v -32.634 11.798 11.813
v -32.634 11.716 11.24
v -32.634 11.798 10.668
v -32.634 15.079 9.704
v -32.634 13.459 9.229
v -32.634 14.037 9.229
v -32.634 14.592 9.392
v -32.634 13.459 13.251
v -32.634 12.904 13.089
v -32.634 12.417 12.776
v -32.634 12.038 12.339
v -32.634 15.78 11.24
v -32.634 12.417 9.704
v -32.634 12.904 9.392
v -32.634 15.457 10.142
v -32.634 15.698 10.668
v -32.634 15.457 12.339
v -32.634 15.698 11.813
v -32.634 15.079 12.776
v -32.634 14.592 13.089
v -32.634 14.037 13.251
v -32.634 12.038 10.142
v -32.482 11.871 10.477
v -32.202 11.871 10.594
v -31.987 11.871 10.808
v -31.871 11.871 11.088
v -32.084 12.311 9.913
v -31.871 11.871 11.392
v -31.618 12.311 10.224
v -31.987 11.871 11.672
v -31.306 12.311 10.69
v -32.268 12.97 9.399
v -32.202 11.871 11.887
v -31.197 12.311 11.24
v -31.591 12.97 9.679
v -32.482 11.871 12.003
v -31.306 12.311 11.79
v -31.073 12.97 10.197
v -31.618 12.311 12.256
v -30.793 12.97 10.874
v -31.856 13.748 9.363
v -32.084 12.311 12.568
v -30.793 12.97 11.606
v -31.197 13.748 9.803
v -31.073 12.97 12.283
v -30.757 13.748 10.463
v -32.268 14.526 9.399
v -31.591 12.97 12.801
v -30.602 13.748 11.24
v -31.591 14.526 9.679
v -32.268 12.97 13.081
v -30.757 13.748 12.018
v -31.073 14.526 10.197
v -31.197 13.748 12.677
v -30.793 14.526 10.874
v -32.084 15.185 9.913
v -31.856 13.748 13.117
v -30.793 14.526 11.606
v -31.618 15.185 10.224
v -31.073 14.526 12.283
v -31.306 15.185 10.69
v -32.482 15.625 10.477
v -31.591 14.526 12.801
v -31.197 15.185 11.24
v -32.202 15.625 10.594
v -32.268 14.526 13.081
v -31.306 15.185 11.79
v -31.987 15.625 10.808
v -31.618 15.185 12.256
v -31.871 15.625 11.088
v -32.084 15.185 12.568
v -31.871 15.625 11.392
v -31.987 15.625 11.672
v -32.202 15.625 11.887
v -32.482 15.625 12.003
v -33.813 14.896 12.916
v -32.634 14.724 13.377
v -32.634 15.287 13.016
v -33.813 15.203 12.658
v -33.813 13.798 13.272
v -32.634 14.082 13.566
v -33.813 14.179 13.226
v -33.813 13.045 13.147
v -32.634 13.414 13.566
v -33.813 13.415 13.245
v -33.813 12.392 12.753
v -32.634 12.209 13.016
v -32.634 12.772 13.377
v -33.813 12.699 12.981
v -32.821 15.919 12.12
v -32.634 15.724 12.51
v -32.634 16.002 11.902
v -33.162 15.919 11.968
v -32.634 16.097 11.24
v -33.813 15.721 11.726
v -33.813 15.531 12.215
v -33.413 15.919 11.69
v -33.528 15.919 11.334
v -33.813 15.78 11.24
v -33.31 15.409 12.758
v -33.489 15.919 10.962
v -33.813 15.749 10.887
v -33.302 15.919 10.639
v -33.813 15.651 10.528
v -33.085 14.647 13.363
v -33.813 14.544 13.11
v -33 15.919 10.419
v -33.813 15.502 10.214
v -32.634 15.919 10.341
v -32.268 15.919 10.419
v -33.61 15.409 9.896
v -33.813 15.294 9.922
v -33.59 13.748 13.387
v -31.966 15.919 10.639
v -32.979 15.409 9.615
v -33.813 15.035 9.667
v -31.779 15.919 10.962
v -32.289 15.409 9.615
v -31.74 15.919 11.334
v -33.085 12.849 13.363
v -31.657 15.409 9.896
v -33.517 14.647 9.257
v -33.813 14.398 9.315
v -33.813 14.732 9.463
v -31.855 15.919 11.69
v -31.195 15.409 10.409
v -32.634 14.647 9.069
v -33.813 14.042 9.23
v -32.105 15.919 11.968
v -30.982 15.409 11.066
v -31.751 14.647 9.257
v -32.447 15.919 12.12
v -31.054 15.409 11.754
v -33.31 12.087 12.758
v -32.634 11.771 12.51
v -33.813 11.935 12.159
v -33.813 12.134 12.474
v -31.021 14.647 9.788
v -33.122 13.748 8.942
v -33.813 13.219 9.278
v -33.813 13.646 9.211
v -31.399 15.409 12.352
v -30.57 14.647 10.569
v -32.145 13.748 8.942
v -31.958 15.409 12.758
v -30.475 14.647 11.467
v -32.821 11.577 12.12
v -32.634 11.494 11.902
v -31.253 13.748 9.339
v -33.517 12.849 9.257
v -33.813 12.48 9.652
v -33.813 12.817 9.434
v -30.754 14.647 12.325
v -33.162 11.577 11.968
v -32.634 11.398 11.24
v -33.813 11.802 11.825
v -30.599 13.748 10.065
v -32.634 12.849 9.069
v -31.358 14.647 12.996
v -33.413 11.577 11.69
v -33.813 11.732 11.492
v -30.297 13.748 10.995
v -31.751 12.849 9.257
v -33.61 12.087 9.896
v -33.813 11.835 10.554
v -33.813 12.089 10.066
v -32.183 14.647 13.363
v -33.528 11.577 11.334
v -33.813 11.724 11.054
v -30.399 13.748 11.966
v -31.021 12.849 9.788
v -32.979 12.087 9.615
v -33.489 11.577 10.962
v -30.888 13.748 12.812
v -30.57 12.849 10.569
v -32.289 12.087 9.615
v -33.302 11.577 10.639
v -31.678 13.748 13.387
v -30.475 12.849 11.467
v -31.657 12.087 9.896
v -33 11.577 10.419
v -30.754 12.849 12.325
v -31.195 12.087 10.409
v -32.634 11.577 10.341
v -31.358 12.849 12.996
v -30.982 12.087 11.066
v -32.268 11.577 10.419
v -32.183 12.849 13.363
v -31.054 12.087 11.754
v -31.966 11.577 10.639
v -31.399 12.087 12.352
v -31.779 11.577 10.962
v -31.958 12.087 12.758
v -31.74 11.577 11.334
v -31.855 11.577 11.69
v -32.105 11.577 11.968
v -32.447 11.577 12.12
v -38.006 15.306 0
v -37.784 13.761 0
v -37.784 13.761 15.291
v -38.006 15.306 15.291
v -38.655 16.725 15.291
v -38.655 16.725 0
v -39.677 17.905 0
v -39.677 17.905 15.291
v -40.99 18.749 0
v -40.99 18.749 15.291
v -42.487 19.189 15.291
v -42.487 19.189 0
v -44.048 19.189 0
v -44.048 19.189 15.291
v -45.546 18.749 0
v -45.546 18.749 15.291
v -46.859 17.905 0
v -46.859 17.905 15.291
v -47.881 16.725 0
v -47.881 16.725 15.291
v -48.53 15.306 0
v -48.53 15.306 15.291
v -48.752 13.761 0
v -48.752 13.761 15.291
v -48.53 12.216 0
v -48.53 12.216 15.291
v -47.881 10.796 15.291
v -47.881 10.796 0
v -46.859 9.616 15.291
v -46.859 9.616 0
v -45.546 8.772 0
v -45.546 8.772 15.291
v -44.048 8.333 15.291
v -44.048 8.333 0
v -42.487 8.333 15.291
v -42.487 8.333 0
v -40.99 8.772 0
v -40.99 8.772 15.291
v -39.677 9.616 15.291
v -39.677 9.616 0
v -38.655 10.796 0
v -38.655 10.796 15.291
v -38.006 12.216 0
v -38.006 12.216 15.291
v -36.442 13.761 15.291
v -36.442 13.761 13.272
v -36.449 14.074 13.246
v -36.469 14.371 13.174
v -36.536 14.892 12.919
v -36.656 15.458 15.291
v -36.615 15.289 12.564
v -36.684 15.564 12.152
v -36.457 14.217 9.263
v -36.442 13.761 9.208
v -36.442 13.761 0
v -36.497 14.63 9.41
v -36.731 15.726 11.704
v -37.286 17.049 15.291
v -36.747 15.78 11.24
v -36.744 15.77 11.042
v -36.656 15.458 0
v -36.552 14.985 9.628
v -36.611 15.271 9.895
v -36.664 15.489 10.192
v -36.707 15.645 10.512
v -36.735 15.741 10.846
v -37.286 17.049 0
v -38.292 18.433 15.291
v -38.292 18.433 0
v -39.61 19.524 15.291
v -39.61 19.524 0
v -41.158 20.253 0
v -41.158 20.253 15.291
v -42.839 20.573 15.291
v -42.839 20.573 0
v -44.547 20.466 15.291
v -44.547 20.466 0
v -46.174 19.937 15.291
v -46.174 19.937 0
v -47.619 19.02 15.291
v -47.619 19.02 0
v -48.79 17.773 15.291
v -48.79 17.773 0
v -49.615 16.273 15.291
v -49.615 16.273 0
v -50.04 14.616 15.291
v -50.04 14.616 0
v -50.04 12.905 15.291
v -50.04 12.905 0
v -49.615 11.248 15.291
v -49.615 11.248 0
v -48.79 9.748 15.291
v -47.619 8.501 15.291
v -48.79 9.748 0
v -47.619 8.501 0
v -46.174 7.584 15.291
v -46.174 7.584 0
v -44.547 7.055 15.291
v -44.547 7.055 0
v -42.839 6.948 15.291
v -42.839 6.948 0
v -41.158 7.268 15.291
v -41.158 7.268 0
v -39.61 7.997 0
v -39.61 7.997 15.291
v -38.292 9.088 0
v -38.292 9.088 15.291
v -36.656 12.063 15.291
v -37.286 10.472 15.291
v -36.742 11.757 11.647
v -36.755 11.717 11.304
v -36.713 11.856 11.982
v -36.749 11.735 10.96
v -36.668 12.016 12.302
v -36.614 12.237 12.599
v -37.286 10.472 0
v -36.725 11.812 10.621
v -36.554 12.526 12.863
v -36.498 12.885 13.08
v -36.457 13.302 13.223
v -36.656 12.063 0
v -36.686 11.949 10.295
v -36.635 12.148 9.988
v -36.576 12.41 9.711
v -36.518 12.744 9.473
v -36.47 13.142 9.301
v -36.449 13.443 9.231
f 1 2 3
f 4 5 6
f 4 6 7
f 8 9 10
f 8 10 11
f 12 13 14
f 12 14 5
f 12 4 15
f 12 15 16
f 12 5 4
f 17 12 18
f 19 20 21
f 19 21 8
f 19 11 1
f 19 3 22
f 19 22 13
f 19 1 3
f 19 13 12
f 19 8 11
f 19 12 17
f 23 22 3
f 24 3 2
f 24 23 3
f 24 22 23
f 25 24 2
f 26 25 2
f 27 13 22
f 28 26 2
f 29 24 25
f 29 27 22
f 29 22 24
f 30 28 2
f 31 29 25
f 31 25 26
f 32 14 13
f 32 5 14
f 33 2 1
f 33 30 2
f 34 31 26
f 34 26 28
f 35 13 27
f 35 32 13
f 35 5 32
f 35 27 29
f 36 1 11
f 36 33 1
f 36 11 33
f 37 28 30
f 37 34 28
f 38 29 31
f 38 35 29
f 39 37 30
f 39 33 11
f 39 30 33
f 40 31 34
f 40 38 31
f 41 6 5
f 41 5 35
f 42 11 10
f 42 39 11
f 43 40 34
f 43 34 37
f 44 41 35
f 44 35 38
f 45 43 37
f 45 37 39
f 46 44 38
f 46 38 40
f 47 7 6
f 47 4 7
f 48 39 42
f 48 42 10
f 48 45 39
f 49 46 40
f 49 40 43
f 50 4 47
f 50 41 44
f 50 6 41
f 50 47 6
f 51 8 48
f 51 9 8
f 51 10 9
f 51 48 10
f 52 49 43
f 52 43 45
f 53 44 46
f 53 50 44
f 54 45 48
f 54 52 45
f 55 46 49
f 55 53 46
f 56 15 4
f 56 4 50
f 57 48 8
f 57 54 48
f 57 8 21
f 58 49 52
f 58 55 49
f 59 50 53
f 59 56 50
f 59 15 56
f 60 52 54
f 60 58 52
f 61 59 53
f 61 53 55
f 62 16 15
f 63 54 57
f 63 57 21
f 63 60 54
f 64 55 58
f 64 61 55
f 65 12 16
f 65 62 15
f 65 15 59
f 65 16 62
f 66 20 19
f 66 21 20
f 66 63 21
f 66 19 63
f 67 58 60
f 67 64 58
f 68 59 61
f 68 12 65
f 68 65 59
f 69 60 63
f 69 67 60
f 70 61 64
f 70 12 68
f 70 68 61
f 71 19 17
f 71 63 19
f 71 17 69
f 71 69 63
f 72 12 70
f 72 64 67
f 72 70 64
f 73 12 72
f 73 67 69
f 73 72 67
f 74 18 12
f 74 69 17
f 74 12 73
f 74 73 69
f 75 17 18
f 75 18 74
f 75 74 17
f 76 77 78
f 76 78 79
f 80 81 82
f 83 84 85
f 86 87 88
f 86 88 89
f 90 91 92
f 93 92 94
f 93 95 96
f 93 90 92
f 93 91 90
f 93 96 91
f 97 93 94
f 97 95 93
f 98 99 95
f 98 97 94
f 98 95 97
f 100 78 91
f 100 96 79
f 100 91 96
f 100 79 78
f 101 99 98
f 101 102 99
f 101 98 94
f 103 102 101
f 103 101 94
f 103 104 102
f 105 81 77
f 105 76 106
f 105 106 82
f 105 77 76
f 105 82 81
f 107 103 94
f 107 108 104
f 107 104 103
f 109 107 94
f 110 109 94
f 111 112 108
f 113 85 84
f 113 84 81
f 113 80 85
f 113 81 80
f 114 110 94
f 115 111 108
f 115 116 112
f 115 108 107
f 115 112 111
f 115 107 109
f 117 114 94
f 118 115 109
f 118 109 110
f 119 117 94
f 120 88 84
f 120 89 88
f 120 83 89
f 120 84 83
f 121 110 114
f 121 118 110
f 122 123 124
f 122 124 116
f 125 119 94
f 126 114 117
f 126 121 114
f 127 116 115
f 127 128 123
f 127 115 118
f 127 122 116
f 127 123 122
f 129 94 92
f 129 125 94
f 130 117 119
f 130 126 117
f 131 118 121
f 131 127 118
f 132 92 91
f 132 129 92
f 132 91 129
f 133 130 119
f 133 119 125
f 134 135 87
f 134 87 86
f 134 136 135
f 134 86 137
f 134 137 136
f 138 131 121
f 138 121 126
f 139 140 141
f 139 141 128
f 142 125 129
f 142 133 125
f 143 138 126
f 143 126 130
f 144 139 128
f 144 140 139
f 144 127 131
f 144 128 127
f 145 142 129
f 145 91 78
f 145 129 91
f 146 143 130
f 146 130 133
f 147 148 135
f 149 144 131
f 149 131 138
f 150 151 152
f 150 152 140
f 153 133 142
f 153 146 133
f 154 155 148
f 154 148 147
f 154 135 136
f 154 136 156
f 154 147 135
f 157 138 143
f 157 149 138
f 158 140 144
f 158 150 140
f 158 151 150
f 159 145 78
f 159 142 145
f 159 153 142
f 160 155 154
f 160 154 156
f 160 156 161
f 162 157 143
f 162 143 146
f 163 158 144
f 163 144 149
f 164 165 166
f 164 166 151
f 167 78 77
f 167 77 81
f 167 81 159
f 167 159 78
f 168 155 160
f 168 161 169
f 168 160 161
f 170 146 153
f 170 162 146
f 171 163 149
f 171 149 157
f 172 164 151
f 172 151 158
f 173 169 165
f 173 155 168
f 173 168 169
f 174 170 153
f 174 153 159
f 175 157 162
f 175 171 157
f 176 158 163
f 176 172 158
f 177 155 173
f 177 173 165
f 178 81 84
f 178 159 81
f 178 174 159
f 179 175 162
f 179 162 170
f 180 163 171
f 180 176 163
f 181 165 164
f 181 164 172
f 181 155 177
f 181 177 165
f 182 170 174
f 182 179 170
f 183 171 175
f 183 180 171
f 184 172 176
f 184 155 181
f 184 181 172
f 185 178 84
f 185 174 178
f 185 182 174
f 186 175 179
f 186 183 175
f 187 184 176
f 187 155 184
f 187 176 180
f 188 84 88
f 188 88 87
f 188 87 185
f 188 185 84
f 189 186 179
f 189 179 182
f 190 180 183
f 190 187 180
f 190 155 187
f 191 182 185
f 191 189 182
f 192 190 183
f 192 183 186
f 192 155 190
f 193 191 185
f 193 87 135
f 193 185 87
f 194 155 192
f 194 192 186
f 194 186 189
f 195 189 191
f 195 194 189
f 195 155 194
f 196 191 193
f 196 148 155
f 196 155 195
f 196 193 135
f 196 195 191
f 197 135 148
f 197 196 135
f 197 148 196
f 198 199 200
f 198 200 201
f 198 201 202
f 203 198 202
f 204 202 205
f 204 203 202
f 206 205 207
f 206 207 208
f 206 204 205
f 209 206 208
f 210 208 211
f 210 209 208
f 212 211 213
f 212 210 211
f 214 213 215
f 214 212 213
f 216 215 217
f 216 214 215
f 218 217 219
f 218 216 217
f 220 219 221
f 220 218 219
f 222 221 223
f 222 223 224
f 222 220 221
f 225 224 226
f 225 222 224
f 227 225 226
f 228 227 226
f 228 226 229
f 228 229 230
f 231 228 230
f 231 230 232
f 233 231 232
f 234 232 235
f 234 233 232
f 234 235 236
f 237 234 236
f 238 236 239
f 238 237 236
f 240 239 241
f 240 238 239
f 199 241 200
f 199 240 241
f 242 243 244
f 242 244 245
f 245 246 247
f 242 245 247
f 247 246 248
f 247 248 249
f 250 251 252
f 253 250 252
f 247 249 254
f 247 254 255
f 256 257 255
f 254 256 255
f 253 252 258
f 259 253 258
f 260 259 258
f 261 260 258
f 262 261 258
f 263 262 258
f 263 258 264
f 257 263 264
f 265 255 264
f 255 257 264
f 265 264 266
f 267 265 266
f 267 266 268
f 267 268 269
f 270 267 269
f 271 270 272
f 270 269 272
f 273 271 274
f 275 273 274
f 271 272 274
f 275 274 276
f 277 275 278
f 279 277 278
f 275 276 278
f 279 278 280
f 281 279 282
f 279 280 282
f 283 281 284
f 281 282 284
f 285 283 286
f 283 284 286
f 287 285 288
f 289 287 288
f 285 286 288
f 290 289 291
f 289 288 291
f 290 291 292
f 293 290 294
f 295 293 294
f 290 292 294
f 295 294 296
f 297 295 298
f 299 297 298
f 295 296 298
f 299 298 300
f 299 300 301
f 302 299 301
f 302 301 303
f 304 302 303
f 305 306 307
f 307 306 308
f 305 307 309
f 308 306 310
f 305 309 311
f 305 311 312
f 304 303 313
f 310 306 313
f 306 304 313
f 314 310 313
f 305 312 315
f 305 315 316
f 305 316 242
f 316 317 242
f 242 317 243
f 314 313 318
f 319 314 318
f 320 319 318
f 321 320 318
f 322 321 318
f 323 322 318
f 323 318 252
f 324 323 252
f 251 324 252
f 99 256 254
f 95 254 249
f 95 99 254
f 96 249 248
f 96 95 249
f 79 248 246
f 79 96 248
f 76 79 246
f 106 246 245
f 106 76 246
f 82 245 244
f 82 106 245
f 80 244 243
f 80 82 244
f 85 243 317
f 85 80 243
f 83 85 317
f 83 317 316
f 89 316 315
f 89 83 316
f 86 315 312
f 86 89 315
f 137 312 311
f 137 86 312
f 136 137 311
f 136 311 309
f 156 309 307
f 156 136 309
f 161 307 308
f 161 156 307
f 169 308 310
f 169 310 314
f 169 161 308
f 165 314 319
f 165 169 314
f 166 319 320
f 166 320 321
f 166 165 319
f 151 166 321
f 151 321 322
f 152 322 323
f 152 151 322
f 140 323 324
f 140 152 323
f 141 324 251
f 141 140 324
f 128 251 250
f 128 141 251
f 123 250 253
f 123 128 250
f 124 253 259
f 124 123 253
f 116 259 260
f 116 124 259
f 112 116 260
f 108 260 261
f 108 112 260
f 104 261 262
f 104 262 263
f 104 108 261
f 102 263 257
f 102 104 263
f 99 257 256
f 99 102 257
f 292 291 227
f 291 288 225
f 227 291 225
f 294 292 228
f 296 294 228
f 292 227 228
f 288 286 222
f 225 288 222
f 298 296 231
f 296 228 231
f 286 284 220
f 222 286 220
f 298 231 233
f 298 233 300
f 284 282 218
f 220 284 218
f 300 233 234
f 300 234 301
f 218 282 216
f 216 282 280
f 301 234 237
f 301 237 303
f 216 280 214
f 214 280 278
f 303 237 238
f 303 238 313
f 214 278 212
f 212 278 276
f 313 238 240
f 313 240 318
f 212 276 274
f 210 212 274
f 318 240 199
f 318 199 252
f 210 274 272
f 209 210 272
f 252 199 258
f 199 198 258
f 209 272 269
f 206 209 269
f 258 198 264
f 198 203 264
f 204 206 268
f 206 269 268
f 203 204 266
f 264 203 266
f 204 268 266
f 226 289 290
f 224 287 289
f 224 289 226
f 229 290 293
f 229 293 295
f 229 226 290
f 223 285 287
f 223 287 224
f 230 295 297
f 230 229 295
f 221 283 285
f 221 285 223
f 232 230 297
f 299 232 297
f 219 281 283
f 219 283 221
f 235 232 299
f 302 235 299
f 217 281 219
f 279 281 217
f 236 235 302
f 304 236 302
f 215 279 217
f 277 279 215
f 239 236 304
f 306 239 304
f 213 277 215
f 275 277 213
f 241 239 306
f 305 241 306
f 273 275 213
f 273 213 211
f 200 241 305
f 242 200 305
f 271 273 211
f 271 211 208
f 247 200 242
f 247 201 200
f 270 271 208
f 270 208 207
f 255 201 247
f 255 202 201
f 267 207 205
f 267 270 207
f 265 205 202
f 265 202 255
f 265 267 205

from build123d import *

# Parameters (mm, degrees)
F0_R          = 6.826248
F0_R_2        = 5.483861
F1_DEPTH      = 15.2908
F3_R          = 2.032
F4_DEPTH      = 2.8956
F4_DEPTH_BACK = 1.6256


with BuildPart() as f1:
    # F0 (on Top) → F1 (new body)
    with BuildSketch(Plane.XY):
        with Locations((-43.26782, 13.760585)):
            Circle(F0_R)
        with Locations((-43.26782, 13.760585)):
            Circle(F0_R_2, mode=Mode.SUBTRACT)
    extrude(amount=F1_DEPTH)

    # F3 (on offset) → F4 (join, two sides)
    with BuildSketch(Plane.YZ.offset(-35.52952)) as f4_sk:
        with Locations((13.747922, 11.24013)):
            Circle(F3_R)
    extrude(amount=F4_DEPTH)
    extrude(f4_sk.sketch, amount=-F4_DEPTH_BACK)

    # F5 (on face) → F6 (revolve)
    with BuildSketch(Plane.YZ.offset(-32.63392)):
        with BuildLine():
            Line((11.398422, 11.24013), (11.715922, 11.24013))
            ThreePointArc((11.715922, 11.24013), (13.747922, 13.27213), (15.779922, 11.24013))
            Line((15.779922, 11.24013), (16.097422, 11.24013))
            ThreePointArc((16.097422, 11.24013), (13.747922, 13.58963), (11.398422, 11.24013))
        make_face()
    revolve(axis=Axis((-32.63392, 12.573172, 11.24013), (0, -1, 0)))


solid = f1.part
